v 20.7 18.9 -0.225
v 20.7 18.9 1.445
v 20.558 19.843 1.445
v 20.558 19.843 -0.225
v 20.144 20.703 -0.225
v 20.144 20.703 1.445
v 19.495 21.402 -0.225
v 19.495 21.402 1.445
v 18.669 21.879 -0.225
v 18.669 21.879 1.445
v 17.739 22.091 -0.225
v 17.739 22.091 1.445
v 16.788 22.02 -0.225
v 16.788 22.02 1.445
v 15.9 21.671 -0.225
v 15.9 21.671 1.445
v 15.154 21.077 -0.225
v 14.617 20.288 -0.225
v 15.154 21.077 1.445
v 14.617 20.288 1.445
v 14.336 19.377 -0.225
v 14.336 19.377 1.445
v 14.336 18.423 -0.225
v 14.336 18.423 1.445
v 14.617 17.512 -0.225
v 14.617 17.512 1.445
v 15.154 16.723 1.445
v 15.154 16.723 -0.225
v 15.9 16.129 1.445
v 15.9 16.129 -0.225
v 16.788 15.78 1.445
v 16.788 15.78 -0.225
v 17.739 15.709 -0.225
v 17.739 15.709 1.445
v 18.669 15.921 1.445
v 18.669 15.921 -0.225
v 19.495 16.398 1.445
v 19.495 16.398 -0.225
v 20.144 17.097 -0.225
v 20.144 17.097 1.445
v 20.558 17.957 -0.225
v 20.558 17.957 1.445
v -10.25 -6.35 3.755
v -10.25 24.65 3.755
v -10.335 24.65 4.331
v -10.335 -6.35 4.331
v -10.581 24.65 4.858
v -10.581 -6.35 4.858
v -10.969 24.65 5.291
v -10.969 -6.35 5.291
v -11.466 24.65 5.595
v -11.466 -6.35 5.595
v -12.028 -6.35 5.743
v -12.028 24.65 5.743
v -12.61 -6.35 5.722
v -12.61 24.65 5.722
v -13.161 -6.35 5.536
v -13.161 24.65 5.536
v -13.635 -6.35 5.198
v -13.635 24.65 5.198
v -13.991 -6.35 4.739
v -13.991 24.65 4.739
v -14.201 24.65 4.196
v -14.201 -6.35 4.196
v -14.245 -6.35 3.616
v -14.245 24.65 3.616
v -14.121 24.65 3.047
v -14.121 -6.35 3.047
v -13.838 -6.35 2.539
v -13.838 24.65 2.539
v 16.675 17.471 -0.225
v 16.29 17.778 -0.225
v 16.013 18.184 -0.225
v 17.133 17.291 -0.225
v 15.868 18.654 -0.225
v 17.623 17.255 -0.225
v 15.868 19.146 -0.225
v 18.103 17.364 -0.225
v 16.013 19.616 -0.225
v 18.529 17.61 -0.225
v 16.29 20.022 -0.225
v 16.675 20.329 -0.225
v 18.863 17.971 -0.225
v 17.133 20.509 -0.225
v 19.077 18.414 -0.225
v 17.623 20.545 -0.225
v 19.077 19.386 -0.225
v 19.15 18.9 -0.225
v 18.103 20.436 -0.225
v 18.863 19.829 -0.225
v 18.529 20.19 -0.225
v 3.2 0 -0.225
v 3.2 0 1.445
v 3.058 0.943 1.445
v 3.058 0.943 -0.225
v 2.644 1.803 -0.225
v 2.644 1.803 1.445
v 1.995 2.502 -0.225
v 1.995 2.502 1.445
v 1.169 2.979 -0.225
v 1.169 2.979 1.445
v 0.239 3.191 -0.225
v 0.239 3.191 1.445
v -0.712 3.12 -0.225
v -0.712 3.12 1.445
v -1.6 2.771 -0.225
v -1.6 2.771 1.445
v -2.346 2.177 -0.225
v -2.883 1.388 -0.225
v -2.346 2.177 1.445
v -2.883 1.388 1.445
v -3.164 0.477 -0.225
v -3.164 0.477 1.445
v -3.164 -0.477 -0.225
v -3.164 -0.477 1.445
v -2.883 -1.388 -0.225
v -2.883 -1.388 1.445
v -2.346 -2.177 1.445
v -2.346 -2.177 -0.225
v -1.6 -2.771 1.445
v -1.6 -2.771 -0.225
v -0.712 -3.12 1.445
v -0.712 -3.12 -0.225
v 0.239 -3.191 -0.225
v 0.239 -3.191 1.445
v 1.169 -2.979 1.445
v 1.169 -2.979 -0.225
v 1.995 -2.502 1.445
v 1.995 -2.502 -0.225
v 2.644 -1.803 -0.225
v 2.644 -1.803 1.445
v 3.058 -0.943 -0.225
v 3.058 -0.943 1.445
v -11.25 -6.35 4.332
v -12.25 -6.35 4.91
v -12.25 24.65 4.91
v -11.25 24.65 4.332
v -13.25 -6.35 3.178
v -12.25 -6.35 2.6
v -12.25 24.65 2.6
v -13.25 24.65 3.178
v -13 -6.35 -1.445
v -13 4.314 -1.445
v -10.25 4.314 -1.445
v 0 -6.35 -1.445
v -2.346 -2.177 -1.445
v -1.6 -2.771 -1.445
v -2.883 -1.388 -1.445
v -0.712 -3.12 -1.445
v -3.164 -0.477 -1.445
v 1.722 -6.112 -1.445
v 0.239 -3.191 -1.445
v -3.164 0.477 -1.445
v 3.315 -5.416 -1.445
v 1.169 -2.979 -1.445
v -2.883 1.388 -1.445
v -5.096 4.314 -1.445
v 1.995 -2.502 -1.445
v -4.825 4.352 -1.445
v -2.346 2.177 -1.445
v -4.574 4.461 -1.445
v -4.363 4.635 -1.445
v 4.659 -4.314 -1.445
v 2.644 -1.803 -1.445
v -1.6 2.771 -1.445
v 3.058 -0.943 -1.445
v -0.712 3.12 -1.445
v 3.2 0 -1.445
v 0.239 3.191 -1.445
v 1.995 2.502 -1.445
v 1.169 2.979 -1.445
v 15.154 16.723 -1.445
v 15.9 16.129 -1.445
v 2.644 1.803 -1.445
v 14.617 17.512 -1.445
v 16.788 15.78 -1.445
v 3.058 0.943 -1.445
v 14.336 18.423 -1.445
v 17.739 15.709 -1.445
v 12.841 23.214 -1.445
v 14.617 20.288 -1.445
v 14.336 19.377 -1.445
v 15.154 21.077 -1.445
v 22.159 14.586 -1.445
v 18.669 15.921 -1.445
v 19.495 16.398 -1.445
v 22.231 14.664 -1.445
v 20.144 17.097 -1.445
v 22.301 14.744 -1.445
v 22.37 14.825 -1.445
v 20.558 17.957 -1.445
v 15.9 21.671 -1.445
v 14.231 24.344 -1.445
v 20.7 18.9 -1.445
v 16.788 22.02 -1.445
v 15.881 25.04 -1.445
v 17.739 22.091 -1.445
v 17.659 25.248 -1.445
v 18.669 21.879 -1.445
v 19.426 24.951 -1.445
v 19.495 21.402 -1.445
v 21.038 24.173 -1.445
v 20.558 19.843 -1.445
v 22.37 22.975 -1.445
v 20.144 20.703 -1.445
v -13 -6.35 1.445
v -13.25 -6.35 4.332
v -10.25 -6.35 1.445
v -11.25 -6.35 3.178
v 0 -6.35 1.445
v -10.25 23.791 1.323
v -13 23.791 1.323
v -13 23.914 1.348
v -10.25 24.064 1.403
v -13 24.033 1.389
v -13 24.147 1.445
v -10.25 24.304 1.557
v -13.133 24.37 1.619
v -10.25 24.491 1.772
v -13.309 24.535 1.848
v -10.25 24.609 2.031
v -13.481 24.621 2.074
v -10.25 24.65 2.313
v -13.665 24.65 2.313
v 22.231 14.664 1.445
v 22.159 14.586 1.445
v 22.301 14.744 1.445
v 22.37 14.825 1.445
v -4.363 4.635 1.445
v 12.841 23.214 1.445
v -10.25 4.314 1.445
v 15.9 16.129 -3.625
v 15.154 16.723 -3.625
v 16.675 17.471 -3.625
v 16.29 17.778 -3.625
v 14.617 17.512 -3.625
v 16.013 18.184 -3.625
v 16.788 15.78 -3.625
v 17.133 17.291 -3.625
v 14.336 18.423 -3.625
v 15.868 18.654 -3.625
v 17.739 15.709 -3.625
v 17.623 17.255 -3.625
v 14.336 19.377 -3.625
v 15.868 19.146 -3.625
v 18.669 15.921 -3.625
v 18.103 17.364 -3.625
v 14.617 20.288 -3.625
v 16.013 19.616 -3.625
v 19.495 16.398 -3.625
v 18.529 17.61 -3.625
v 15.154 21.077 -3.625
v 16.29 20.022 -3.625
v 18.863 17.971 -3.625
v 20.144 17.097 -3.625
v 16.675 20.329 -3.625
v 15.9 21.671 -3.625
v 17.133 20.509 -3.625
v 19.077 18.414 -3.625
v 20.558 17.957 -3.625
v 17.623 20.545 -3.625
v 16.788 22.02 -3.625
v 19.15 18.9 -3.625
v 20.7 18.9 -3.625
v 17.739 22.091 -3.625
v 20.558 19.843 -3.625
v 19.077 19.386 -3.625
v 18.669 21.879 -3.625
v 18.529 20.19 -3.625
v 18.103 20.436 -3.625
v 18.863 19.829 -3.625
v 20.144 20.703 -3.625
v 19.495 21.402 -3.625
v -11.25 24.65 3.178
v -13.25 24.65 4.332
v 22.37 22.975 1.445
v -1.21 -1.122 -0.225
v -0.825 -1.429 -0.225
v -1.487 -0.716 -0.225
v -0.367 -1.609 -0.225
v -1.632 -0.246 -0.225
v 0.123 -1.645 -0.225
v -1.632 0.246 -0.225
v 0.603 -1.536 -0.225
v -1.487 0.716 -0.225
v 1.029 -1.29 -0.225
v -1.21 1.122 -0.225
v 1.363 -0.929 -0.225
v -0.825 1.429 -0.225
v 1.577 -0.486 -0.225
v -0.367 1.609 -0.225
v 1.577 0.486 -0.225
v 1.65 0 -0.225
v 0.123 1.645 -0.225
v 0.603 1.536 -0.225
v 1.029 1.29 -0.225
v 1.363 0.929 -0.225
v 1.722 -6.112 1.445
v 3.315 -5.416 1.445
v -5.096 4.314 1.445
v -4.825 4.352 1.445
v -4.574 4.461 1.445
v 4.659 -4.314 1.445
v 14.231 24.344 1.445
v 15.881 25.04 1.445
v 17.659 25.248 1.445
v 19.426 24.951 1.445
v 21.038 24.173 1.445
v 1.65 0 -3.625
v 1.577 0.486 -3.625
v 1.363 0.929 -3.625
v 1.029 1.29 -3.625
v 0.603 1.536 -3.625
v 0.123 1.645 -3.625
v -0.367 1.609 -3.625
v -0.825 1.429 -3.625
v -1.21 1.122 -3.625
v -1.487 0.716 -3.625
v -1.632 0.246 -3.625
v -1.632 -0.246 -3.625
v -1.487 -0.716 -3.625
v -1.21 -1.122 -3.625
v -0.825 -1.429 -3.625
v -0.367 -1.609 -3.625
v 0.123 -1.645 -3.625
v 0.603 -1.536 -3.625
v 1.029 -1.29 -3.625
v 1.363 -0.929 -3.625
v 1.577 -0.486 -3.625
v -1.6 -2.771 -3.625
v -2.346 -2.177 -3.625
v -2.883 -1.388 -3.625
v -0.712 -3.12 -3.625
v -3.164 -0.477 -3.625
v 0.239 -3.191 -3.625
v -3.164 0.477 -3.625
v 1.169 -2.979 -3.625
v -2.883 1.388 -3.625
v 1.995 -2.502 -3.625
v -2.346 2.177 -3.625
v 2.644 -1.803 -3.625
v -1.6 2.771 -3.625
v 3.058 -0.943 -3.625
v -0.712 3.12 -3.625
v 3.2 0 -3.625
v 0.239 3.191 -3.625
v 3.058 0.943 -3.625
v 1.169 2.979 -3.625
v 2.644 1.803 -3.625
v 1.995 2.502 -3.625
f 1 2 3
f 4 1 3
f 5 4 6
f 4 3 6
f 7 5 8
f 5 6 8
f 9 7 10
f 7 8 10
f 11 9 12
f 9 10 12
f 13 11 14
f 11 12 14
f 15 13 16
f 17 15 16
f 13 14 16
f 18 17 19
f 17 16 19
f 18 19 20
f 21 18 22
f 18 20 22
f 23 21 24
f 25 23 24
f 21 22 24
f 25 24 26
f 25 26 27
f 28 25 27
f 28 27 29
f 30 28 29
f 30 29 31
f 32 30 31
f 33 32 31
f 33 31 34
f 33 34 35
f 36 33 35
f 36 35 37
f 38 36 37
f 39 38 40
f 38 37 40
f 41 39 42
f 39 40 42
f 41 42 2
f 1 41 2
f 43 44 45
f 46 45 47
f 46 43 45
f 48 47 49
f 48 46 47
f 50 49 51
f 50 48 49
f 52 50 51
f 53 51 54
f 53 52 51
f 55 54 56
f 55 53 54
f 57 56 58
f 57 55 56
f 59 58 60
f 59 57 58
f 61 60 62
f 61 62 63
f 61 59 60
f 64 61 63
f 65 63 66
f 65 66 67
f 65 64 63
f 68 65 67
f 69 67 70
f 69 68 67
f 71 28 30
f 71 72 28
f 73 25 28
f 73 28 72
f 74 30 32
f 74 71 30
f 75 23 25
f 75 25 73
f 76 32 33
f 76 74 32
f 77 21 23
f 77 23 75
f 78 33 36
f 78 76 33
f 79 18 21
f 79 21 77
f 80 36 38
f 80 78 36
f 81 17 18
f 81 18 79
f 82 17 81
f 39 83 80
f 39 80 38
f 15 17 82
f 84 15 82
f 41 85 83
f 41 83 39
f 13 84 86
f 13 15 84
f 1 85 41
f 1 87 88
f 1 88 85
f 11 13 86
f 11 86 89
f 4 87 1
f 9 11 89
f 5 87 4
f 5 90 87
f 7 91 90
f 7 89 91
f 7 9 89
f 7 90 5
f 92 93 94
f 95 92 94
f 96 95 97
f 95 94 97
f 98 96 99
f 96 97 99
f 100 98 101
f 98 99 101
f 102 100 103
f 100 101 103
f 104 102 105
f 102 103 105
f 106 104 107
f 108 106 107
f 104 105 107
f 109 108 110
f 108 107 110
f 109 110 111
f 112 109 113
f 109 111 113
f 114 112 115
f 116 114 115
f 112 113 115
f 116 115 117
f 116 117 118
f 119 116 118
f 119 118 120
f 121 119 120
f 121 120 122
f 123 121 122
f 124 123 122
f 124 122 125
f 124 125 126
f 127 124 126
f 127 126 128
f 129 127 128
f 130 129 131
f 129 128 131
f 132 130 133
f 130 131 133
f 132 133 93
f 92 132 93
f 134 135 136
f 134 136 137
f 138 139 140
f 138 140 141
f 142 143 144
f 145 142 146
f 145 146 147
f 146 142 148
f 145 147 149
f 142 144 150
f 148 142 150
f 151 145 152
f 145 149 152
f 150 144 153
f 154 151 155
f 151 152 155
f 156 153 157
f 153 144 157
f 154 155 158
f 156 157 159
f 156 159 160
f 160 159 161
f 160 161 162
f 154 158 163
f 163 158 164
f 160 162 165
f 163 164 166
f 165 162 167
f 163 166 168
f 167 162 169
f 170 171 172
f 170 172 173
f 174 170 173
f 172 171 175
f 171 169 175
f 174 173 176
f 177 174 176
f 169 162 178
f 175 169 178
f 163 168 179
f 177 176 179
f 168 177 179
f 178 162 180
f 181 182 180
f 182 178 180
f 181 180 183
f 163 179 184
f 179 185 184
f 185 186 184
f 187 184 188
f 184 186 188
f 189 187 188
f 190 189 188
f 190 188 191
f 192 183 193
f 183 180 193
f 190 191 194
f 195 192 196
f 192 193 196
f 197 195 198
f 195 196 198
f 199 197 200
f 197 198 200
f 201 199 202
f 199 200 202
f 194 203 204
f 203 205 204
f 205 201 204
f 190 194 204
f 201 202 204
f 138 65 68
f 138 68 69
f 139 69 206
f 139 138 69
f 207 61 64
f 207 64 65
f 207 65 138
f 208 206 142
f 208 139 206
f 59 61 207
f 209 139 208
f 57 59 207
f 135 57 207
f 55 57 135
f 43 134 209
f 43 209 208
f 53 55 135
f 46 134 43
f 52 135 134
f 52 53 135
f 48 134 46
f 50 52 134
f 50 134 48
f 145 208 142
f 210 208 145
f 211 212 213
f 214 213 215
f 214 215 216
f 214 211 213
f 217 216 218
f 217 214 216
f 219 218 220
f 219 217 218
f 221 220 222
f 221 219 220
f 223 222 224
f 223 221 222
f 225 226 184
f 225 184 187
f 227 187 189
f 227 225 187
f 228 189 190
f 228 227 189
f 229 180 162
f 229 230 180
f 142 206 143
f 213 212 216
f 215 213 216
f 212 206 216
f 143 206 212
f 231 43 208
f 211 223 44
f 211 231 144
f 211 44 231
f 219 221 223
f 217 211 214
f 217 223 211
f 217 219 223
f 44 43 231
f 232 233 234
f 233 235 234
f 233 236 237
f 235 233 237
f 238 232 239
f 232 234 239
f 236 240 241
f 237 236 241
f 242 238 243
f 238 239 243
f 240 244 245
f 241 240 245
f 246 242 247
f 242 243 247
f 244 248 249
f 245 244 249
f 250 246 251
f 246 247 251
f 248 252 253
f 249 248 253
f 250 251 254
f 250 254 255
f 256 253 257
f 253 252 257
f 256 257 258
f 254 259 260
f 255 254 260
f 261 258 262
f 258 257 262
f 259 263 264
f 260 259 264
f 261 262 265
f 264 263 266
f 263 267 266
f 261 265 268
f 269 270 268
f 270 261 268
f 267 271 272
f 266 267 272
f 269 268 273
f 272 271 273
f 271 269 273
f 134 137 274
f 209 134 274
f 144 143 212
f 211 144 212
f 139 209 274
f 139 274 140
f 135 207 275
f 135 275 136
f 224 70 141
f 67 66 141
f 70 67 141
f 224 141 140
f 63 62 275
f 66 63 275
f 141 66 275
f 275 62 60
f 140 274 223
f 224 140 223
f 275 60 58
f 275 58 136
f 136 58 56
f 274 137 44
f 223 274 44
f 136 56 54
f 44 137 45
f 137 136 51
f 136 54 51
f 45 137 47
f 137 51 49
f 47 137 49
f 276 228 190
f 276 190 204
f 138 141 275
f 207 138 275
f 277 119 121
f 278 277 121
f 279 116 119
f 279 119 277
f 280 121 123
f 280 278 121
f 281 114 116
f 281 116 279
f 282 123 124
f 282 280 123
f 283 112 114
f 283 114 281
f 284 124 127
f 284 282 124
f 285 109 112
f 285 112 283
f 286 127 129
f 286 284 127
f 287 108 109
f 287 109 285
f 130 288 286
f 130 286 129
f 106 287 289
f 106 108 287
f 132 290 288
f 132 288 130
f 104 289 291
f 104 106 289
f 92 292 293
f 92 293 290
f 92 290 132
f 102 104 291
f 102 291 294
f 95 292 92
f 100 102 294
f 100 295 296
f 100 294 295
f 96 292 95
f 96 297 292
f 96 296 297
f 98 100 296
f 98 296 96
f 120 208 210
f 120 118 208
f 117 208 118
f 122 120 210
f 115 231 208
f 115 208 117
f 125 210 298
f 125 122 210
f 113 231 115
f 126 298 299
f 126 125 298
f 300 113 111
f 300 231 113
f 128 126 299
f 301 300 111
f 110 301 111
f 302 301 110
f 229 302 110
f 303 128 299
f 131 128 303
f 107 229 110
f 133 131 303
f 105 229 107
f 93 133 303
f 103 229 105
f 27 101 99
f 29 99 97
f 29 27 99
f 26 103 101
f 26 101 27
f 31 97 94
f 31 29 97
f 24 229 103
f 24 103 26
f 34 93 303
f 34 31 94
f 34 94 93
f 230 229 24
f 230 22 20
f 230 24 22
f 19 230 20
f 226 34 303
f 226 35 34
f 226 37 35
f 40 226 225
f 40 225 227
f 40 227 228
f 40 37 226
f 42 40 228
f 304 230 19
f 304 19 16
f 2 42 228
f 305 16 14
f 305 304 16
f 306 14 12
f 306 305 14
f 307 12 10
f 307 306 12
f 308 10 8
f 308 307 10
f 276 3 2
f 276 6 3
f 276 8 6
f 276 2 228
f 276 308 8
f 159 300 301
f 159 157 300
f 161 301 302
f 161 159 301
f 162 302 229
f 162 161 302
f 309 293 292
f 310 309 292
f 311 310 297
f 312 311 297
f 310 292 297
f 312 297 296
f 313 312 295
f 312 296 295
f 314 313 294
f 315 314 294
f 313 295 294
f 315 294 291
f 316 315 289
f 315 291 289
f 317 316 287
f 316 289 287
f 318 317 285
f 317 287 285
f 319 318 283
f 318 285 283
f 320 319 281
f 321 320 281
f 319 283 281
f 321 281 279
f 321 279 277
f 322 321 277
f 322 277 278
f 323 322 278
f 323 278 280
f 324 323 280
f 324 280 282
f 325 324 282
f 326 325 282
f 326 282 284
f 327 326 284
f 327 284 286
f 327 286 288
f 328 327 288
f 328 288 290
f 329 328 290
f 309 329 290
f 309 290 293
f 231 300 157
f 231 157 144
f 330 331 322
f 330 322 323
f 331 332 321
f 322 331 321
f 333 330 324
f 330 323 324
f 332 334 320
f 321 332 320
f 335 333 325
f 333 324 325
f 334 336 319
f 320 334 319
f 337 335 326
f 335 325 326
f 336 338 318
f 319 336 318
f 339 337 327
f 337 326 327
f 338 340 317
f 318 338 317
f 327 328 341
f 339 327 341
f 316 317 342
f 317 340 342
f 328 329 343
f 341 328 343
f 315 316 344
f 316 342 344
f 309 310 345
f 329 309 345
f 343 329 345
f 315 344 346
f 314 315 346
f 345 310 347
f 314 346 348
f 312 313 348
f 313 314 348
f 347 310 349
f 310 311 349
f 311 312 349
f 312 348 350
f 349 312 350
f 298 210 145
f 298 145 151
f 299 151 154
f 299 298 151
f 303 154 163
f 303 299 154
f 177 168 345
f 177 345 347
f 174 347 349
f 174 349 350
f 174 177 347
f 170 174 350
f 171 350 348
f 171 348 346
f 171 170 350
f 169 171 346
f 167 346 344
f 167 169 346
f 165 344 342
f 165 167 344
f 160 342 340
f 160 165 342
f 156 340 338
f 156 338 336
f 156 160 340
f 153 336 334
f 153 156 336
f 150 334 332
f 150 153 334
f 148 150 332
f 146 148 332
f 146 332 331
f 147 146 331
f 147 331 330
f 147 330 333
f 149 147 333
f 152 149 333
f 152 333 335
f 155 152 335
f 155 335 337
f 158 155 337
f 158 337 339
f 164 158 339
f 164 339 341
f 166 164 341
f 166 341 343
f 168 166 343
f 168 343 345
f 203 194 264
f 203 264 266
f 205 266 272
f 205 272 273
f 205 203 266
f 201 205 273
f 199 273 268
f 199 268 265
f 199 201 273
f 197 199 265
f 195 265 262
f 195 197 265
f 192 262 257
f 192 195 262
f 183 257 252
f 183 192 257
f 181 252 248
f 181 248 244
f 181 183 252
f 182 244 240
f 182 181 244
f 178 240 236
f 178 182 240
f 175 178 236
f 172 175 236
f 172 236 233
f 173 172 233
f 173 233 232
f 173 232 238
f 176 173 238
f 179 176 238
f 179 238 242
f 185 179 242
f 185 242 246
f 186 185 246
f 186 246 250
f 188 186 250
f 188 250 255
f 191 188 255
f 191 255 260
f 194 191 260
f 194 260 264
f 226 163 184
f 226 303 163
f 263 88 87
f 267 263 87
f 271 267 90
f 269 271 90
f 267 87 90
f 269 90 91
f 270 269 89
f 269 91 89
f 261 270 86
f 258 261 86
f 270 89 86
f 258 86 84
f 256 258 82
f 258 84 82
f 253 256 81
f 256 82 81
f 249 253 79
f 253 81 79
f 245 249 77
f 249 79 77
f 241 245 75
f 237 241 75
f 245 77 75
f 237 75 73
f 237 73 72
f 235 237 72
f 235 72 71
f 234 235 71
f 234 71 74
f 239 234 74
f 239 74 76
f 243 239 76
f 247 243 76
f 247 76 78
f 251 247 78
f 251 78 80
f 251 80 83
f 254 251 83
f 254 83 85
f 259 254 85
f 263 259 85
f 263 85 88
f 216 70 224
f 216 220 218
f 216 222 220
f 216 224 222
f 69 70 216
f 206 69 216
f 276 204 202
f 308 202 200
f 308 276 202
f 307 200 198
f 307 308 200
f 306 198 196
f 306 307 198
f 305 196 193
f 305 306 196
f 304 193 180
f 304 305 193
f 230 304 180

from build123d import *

# Parameters (mm, degrees)
BOSS_EXTRUDE1_DEPTH = 1.445
SKETCH2_R           = 3.2
CUT_EXTRUDE1_DEPTH  = 1.67
SKETCH3_R           = 3.2
BOSS_EXTRUDE2_DEPTH = 3.4
CUT_EXTRUDE3_DEPTH  = 36.101138158
SKETCH6_R           = 1.65
CUT_EXTRUDE4_DEPTH  = 34.904858059
BOSS_EXTRUDE3_DEPTH = 2.89
BOSS_EXTRUDE4_DEPTH = 31
BOSS_EXTRUDE5_DEPTH = 2.75
FILLET2_R           = 1


with BuildPart() as part:
    # Sketch1 → Boss-Extrude1 (new, symmetric)
    with BuildSketch(Plane.XY):
        with BuildLine():
            Line((4.65938028, -4.314241), (22.15938028, 14.585759))
            ThreePointArc((22.15938028, 14.585759), (21.814241, 23.55938028), (12.84061972, 23.214241))
            Line((12.84061972, 23.214241), (-4.65938028, 4.314241))
            ThreePointArc((-4.65938028, 4.314241), (-4.314241, -4.65938028), (4.65938028, -4.314241))
        make_face()
    extrude(amount=BOSS_EXTRUDE1_DEPTH, both=True)

    # Sketch2 → Cut-Extrude1 (cut)
    with BuildSketch(Plane.XY.offset(1.445)):
        Circle(SKETCH2_R)
        with Locations((17.5, 18.9)):
            Circle(SKETCH2_R)
    extrude(amount=-CUT_EXTRUDE1_DEPTH, mode=Mode.SUBTRACT)

    # Sketch3 → Boss-Extrude2 (add)
    with BuildSketch(Plane.XY.offset(-0.225)):
        Circle(SKETCH3_R)
        with Locations((17.5, 18.9)):
            Circle(SKETCH3_R)
    extrude(amount=-BOSS_EXTRUDE2_DEPTH)

    # Sketch5 → Cut-Extrude3 (cut, through all)
    with BuildSketch(Plane.XY.offset(1.445)):
        with BuildLine():
            Line((22.37, 14.825003067), (22.37, 22.974996933))
            ThreePointArc((22.37, 22.974996933), (23.85, 18.9), (22.37, 14.825003067))
        make_face()
    extrude(amount=-CUT_EXTRUDE3_DEPTH, mode=Mode.SUBTRACT)

    # Sketch6 → Cut-Extrude4 (cut, through all)
    with BuildSketch(Plane.XY.offset(-0.225)):
        Circle(SKETCH6_R)
        with Locations((17.5, 18.9)):
            Circle(SKETCH6_R)
    extrude(amount=-CUT_EXTRUDE4_DEPTH, mode=Mode.SUBTRACT)

    # Sketch7 → Boss-Extrude3 (add)
    with BuildSketch(Plane.XY.offset(1.445)):
        with BuildLine():
            Line((-4.65938028, 4.314241), (-13, 4.314241))
            Line((-13, 4.314241), (-13, -6.35))
            Line((-13, -6.35), (0, -6.35))
            ThreePointArc((0, -6.35), (-5.818845691, -2.542348289), (-4.65938028, 4.314241))
        make_face()
    extrude(amount=-BOSS_EXTRUDE3_DEPTH)

    # Sketch8 → Boss-Extrude4 (add)
    with BuildSketch(Plane.XZ.offset(6.35)):
        with BuildLine():
            Line((-13.837814719, 2.538922528), (-13, 1.445))
            Line((-13, 1.445), (-10.25, 1.445))
            Line((-10.25, 1.445), (-10.25, 3.755))
            ThreePointArc((-10.25, 3.755), (-12.892016574, 5.649152771), (-13.837814719, 2.538922528))
        make_face()
        Polygon((-11.25, 3.177649731), (-12.25, 2.600299462), (-13.25, 3.177649731), (-13.25, 4.332350269), (-12.25, 4.909700538), (-11.25, 4.332350269), align=None, mode=Mode.SUBTRACT)
    extrude(amount=-BOSS_EXTRUDE4_DEPTH)

    # Sketch10 → Boss-Extrude5 (add)
    with BuildSketch(Plane.ZY.offset(13)):
        Polygon((-1.445, 4.314241), (1.445, 24.65), (1.445, 4.314241), align=None)
    extrude(amount=-BOSS_EXTRUDE5_DEPTH)

    # Fillet2
    fillet2_edges = [part.edges().sort_by_distance(p)[0] for p in [
        (-4.65938028, 4.314241, 0),
        (-11.625, 24.65, 1.445),
    ]]
    fillet(fillet2_edges, radius=FILLET2_R)


solid = part.part
